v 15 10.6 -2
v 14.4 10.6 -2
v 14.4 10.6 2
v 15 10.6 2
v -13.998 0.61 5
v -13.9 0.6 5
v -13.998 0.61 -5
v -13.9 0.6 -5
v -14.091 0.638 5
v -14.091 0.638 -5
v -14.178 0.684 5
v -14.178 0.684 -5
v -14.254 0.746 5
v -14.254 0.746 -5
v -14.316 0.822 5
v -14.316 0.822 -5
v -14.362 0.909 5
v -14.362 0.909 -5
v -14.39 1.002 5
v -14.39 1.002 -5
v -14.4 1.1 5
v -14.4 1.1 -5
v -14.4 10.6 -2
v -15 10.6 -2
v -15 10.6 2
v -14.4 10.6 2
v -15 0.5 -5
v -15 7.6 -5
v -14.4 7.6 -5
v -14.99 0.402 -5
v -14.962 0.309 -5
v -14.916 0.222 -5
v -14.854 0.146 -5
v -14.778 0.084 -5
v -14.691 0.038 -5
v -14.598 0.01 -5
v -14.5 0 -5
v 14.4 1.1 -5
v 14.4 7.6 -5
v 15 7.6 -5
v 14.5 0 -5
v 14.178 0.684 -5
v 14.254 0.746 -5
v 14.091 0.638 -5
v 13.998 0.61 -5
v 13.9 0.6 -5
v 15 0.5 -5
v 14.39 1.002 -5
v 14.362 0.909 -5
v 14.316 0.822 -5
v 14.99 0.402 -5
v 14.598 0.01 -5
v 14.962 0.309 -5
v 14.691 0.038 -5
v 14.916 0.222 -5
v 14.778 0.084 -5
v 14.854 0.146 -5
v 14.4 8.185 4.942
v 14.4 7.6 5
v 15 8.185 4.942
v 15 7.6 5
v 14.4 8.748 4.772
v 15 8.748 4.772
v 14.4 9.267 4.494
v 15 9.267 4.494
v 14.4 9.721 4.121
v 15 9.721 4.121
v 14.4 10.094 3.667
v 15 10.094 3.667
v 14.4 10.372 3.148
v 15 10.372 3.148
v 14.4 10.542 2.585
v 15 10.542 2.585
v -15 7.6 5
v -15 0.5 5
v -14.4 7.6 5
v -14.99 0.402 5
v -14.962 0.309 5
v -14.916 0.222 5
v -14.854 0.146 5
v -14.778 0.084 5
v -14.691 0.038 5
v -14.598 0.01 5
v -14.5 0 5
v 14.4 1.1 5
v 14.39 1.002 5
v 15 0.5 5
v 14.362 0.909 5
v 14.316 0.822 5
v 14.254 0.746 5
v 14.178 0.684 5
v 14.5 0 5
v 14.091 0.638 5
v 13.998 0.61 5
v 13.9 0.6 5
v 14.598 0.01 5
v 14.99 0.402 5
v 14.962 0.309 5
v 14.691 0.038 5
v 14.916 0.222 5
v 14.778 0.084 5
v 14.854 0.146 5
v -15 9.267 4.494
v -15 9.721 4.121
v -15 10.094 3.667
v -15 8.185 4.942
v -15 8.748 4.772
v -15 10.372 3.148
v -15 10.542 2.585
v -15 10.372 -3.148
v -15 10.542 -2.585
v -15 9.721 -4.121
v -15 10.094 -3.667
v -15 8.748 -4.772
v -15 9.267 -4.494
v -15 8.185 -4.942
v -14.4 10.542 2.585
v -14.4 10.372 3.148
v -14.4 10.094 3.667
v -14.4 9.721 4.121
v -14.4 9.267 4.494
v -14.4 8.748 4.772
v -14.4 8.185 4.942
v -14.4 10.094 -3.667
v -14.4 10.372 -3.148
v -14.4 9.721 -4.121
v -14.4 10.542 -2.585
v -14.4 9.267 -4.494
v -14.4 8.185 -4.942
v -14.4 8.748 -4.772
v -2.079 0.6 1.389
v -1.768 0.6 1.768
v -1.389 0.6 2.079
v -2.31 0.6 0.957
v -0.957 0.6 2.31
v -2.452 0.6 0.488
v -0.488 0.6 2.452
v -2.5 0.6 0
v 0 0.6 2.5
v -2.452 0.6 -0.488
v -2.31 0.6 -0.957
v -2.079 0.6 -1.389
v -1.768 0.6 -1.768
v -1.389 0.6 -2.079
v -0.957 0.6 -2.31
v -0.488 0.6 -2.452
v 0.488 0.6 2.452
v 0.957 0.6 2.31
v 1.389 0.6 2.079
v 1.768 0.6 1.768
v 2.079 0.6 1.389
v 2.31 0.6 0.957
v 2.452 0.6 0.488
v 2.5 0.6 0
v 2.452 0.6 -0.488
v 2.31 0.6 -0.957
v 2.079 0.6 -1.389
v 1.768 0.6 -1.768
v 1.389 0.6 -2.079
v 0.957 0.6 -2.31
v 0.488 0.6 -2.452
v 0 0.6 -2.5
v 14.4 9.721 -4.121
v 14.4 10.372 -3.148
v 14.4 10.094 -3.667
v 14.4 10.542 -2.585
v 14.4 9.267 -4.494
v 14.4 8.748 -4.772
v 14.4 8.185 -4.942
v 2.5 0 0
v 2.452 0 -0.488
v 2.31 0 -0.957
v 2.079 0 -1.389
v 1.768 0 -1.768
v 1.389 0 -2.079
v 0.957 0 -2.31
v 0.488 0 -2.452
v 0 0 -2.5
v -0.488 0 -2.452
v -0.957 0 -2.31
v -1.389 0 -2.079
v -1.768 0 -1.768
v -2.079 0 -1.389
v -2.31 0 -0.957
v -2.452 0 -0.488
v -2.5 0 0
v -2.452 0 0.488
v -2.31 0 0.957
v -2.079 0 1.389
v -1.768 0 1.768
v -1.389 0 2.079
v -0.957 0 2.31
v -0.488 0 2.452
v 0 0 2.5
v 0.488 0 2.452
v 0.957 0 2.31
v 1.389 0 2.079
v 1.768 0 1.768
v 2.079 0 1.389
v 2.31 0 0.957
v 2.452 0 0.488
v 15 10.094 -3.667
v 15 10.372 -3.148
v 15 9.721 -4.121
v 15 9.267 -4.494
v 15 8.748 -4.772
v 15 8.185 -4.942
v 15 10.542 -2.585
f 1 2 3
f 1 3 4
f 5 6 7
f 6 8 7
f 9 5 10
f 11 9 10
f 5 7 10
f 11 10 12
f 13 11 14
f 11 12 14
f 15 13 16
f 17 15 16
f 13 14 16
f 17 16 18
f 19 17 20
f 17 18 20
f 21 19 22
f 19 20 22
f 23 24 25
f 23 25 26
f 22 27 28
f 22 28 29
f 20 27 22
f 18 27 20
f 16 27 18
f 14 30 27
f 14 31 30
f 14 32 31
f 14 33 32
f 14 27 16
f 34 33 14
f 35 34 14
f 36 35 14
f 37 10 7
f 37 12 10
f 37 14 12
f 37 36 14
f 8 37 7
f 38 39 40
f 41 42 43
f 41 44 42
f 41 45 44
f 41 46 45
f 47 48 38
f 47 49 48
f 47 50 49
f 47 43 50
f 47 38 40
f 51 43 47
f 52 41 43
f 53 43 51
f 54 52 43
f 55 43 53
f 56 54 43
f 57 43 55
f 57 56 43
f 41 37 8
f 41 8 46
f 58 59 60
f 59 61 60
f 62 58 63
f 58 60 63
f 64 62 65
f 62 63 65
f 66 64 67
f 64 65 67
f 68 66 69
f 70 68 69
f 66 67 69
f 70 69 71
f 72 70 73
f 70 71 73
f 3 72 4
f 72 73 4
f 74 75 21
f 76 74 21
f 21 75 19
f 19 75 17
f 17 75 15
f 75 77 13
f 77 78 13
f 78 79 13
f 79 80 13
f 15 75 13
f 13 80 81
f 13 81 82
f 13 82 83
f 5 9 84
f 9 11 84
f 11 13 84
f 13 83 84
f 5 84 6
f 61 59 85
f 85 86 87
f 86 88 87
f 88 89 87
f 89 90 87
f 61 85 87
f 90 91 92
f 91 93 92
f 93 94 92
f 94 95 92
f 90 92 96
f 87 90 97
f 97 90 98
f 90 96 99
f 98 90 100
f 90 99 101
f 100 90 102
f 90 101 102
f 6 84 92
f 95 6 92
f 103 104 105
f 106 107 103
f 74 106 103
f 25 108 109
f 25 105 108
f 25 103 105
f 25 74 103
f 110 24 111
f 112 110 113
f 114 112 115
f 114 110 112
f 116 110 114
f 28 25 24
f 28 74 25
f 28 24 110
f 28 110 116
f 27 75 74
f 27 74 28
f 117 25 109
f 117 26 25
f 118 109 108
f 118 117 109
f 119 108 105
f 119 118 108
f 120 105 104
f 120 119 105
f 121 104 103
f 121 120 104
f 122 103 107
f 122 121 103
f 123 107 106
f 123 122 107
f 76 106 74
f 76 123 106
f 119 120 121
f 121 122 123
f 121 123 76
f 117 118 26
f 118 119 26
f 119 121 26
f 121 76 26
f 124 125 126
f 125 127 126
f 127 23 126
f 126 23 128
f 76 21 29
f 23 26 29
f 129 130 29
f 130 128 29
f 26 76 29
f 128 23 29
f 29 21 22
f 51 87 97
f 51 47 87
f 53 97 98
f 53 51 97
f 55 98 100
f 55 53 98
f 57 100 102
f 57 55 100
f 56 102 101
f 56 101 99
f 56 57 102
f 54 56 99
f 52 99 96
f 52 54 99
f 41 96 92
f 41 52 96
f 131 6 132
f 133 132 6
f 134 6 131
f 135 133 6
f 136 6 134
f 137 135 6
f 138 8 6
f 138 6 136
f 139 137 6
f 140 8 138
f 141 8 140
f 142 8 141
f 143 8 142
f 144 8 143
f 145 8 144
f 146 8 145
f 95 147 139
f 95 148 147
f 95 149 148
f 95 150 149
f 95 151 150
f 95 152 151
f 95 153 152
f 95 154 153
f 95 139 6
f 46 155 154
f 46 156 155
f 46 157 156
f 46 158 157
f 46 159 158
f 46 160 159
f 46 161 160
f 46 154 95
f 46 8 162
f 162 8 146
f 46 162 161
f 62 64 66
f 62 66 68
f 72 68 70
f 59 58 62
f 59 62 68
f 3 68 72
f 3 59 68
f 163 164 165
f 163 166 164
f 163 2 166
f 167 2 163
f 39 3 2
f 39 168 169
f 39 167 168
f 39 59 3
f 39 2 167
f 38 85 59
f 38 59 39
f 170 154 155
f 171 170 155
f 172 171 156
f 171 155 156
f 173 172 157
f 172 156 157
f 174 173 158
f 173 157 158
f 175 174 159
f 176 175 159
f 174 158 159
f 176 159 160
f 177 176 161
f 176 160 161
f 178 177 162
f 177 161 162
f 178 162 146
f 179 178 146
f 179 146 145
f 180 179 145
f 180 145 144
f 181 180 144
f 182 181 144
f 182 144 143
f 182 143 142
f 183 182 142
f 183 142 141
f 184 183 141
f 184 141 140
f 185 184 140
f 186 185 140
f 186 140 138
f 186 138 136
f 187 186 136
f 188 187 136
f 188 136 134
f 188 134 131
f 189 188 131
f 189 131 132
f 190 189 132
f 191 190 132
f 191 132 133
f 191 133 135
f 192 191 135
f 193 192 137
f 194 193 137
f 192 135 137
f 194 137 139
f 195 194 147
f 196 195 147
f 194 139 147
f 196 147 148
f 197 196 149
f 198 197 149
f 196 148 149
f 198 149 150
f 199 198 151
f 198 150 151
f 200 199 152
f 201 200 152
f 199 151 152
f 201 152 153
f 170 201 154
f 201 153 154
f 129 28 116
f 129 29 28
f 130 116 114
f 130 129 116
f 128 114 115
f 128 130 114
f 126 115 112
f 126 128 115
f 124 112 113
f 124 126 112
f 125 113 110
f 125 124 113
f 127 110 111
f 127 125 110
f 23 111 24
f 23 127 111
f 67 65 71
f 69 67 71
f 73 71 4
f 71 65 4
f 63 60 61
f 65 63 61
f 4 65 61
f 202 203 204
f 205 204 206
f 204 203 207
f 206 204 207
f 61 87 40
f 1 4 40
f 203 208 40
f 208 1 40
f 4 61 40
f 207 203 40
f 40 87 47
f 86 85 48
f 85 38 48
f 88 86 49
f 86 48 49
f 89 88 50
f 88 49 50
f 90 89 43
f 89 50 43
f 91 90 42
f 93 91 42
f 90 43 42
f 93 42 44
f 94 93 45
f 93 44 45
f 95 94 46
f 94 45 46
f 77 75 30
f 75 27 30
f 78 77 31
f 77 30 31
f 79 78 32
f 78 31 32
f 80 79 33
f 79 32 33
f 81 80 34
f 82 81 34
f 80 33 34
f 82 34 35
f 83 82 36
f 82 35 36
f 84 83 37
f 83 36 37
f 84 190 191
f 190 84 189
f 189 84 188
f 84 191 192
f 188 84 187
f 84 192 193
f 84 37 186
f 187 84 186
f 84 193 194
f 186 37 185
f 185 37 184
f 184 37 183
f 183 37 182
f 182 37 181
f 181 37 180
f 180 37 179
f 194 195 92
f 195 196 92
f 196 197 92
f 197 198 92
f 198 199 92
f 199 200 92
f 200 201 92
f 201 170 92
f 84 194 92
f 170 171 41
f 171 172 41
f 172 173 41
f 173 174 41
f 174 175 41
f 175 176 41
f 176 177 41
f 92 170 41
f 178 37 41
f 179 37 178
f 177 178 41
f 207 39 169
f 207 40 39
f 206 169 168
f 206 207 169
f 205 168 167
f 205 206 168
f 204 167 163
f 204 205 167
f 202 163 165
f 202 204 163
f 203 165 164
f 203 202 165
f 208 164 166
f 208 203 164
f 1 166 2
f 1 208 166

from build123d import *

# Parameters (mm, degrees)
SKETCH1_W           = 30
SKETCH1_H           = 10
BOSS_EXTRUDE1_DEPTH = 0.6
SKETCH2_W           = 0.6
SKETCH2_H           = 10
BOSS_EXTRUDE2_DEPTH = 10
FILLET1_R           = 0.5
FILLET2_R           = 3
CUT_EXTRUDE1_REACH  = 2.6
SKETCH3_R           = 2.5


with BuildPart() as part:
    # Sketch1 → Boss-Extrude1 (new body)
    with BuildSketch(Plane(origin=(0, 0, 0), x_dir=(1, 0, 0), z_dir=(0, 1, 0))):
        Rectangle(SKETCH1_W, SKETCH1_H)
    extrude(amount=BOSS_EXTRUDE1_DEPTH)

    # Sketch2 → Boss-Extrude2 (add)
    with BuildSketch(Plane(origin=(0, 0.6, 0), x_dir=(1, 0, 0), z_dir=(0, 1, 0))):
        with Locations((-14.7, 0)):
            Rectangle(SKETCH2_W, SKETCH2_H)
        with Locations((14.7, 0)):
            Rectangle(SKETCH2_W, SKETCH2_H)
    extrude(amount=BOSS_EXTRUDE2_DEPTH)

    # Fillet1
    fillet1_edges = [part.edges().sort_by_distance(p)[0] for p in [
        (-14.4, 0.6, 0),
        (14.4, 0.6, 0),
        (-15, 0, 0),
        (15, 0, 0),
    ]]
    fillet(fillet1_edges, radius=FILLET1_R)

    # Fillet2
    fillet2_edges = [part.edges().sort_by_distance(p)[0] for p in [
        (-14.7, 10.6, 5),
        (-14.7, 10.6, -5),
        (14.7, 10.6, -5),
        (14.7, 10.6, 5),
    ]]
    fillet(fillet2_edges, radius=FILLET2_R)

    # Sketch3 → Cut-Extrude1 (cut, up to next)
    with BuildSketch(Plane(origin=(0, 0.6, 0), x_dir=(1, 0, 0), z_dir=(0, 1, 0)), mode=Mode.PRIVATE) as cut_extrude1_sk1:
        Circle(SKETCH3_R)
    cut_extrude1_tool1 = extrude(cut_extrude1_sk1.sketch, amount=-CUT_EXTRUDE1_REACH, mode=Mode.PRIVATE) & part.part
    add(cut_extrude1_tool1.solids().sort_by_distance((0, 0.6, 0))[0], mode=Mode.SUBTRACT)


solid = part.part
